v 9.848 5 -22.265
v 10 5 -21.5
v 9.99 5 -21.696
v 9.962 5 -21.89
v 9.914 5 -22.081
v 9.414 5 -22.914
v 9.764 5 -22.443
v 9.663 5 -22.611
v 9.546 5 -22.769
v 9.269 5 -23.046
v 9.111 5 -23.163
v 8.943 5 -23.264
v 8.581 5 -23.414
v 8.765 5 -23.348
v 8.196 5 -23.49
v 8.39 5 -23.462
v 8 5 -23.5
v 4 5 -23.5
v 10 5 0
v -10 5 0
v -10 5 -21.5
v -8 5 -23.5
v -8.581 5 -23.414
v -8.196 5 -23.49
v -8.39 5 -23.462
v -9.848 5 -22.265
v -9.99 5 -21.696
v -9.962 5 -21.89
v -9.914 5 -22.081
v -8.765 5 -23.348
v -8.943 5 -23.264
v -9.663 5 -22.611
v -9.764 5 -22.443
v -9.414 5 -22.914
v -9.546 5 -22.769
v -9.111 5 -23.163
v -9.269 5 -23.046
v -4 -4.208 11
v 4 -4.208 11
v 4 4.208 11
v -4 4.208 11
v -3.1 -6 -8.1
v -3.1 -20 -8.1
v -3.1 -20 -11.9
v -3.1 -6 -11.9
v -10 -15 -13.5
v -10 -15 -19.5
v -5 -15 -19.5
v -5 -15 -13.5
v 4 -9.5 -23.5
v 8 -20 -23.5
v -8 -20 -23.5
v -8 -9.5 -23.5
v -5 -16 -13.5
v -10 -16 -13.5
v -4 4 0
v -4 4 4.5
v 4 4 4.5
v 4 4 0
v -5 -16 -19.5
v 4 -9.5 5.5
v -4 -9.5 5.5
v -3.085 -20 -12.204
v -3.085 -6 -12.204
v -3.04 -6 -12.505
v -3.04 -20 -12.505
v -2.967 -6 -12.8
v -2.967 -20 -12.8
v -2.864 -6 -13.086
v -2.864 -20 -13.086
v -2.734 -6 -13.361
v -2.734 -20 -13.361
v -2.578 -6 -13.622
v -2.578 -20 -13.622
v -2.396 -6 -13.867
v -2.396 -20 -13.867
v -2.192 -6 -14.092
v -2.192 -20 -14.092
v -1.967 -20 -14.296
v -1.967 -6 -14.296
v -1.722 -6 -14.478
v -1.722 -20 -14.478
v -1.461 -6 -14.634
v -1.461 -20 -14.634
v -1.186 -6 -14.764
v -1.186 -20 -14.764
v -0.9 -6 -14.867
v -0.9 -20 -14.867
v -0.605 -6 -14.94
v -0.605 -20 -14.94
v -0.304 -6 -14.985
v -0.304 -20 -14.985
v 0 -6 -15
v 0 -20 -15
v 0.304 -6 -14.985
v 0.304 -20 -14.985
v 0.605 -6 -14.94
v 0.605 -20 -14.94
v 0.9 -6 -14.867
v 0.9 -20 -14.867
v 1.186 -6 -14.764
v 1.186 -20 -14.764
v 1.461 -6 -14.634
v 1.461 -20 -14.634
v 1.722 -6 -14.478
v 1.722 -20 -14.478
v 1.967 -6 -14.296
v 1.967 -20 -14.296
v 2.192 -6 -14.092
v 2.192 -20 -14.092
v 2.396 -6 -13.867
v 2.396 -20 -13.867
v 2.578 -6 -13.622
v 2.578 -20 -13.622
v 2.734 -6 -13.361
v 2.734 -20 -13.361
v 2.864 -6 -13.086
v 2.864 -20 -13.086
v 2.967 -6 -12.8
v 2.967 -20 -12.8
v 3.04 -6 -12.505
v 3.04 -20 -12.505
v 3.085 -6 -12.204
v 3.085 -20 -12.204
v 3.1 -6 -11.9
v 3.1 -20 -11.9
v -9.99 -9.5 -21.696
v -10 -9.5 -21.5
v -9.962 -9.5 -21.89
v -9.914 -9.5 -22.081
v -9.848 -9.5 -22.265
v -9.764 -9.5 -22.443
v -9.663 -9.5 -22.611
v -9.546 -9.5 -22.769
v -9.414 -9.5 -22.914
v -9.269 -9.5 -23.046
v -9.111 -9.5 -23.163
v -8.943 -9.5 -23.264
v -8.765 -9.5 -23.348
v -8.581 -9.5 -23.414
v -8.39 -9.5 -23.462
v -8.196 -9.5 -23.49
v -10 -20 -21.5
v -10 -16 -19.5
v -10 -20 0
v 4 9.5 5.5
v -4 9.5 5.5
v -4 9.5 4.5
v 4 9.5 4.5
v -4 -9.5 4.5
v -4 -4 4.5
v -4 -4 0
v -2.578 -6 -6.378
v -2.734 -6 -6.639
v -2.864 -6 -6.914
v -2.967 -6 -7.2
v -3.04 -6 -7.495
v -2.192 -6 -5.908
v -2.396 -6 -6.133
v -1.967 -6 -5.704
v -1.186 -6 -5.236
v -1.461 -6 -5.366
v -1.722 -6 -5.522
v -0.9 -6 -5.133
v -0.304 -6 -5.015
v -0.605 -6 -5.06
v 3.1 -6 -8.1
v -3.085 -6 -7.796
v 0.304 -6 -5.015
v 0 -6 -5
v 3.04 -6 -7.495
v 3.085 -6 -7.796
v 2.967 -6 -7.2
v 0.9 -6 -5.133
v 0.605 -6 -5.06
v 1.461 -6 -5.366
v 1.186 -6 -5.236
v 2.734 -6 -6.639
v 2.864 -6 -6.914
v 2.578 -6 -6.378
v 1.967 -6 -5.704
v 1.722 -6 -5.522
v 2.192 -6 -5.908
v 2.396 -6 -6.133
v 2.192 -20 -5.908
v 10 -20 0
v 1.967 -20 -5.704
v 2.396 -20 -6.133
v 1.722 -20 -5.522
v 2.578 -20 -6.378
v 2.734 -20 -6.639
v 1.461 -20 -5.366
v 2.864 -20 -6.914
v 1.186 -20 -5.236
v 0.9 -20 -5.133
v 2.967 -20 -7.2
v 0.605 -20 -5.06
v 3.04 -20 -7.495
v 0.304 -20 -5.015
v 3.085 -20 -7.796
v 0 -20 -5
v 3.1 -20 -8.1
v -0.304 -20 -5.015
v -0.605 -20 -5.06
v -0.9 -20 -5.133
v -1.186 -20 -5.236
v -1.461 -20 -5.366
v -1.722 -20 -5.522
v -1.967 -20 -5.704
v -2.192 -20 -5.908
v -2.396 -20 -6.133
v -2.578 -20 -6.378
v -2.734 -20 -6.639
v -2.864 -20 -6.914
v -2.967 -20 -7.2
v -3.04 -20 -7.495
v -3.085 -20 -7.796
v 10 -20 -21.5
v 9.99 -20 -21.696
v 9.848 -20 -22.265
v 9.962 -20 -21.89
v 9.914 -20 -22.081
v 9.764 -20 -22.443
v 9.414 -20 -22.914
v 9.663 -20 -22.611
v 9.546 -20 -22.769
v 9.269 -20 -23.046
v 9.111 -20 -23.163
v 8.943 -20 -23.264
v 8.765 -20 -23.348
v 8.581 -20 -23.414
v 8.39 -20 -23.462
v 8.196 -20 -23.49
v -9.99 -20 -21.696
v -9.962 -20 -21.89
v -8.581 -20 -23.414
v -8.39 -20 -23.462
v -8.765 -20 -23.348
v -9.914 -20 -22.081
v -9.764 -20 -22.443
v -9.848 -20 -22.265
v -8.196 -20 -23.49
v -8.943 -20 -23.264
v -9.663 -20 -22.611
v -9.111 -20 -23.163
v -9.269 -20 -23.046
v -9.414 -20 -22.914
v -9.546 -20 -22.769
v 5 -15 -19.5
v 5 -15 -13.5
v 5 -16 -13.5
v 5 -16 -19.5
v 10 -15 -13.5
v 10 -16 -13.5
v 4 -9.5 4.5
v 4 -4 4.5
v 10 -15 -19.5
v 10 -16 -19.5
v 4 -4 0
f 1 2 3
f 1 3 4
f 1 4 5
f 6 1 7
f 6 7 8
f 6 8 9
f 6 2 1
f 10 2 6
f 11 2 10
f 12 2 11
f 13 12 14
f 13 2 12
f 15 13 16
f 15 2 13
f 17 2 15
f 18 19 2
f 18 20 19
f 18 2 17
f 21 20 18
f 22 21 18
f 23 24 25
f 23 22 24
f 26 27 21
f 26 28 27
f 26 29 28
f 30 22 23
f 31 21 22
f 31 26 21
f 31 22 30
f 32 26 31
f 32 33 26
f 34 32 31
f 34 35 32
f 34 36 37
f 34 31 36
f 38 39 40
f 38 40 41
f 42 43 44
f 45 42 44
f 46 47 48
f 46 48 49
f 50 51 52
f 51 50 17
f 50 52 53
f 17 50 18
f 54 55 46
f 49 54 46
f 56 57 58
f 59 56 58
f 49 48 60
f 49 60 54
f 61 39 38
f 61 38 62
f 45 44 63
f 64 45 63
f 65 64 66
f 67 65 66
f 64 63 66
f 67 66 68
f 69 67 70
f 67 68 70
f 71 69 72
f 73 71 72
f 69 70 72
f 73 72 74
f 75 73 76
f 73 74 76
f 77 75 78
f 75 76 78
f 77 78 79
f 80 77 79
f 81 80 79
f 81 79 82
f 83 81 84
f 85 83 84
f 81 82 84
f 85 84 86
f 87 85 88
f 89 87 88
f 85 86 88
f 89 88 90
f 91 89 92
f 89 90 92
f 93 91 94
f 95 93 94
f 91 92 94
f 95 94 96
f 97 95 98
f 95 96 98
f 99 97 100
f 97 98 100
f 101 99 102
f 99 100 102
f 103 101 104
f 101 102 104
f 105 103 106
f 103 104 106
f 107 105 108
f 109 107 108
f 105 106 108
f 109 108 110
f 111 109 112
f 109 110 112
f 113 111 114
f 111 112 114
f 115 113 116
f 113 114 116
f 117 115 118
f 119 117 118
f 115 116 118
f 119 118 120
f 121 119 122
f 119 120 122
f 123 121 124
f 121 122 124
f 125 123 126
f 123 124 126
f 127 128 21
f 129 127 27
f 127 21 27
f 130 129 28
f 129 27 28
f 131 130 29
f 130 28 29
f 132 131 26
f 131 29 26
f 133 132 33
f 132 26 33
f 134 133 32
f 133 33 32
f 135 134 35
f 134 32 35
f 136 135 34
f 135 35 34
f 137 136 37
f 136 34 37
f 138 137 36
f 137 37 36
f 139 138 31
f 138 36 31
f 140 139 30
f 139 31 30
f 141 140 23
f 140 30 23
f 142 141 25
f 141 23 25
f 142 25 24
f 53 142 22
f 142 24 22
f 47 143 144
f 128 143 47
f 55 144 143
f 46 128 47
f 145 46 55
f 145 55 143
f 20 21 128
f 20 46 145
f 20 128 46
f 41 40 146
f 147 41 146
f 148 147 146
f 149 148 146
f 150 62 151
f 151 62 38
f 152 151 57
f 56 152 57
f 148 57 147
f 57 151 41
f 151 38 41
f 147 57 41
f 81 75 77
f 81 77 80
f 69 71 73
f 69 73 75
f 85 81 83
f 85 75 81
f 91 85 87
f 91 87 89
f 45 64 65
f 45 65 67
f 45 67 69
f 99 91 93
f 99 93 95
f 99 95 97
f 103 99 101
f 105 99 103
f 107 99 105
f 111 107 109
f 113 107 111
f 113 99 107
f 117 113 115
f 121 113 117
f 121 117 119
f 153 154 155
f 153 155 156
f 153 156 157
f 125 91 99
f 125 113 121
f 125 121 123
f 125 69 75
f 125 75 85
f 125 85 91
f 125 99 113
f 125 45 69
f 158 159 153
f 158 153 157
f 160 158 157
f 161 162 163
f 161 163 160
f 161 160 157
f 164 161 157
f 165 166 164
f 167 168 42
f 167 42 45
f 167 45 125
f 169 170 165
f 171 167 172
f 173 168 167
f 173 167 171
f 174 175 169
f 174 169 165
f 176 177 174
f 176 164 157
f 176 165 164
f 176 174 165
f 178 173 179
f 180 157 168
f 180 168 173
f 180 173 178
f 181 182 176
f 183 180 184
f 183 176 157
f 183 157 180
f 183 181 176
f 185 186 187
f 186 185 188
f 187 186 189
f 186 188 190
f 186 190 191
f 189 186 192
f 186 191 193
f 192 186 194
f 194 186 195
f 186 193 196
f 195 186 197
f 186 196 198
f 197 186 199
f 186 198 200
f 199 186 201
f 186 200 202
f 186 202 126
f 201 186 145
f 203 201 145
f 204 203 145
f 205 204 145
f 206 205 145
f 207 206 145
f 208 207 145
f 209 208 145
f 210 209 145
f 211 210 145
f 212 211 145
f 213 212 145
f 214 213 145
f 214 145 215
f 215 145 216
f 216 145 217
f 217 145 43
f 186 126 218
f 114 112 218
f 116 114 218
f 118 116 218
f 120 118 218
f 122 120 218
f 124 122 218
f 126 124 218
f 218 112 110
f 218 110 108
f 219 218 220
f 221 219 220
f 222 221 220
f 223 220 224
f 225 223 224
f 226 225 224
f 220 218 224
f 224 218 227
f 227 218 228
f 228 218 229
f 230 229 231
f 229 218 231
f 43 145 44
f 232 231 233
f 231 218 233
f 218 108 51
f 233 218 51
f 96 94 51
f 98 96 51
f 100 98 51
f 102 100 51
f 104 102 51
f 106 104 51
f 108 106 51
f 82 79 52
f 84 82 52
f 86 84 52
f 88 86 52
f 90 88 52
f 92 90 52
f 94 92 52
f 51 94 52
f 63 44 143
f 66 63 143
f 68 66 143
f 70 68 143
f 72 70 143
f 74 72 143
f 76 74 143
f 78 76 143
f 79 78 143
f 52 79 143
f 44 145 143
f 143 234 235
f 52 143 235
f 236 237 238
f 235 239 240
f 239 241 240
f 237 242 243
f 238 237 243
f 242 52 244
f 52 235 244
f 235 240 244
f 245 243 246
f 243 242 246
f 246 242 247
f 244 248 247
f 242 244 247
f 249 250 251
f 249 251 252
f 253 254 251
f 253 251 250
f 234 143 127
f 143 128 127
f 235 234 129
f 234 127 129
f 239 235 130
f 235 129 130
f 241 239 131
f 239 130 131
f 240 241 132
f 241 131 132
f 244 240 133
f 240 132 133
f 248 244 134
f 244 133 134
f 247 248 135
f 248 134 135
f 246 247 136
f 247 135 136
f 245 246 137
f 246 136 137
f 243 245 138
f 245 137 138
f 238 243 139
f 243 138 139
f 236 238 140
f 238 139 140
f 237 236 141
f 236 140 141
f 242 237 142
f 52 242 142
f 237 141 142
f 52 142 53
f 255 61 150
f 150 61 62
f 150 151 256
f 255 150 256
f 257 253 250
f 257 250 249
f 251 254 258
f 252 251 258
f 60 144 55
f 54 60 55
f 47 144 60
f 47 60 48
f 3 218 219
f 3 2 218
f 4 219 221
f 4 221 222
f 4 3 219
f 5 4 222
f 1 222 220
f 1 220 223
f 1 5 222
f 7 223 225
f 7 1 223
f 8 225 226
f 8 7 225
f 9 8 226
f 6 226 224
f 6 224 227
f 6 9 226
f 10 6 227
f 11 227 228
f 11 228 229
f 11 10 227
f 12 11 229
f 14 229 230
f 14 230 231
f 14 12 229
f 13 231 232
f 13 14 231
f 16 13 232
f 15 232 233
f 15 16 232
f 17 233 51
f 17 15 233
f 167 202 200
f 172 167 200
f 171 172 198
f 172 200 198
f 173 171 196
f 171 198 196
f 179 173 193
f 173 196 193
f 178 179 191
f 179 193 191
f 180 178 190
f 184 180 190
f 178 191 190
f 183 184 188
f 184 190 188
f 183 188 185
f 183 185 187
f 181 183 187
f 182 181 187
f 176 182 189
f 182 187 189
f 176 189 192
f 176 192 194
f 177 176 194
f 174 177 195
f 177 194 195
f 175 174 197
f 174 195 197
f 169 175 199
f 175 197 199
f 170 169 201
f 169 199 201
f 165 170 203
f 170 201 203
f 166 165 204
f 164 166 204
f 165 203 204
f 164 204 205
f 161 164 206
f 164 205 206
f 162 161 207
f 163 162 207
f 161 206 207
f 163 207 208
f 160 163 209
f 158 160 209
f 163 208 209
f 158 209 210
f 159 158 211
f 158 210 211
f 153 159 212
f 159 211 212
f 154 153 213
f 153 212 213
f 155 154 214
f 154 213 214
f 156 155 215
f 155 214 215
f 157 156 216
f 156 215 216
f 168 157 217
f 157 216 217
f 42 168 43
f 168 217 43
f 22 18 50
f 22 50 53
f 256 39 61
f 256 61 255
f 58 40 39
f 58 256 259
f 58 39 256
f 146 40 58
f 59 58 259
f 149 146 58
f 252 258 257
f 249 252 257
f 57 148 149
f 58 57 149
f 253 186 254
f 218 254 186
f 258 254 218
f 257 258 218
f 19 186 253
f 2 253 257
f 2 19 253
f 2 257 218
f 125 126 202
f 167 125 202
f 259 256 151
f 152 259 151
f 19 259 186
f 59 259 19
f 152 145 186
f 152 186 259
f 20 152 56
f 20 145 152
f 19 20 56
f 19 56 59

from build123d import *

# Parameters (mm, degrees)
ESTRUSIONE_ESTRUSIONE1_DEPTH = 8
SCHIZZO2_W                   = 14
SCHIZZO2_H                   = 5.5
ESTRUSIONE_ESTRUSIONE2_DEPTH = 9.208407085
SCHIZZO3_W                   = 6
SCHIZZO3_H                   = 5.5
ESTRUSIONE_ESTRUSIONE3_DEPTH = 5.291592915
SCHIZZO4_W                   = 14
SCHIZZO4_H                   = 14.5
ESTRUSIONE_ESTRUSIONE4_DEPTH = 5.5
ESTRUSIONE_ESTRUSIONE5_DEPTH = 4.5
TAGLIO_ESTRUSIONE1_DEPTH     = 8
TAGLIO_ESTRUSIONE2_DEPTH     = 5.5
SCHIZZO8_W                   = 14
SCHIZZO8_H                   = 19
ESTRUSIONE_ESTRUSIONE6_DEPTH = 23.5
ESTRUSIONE_ESTRUSIONE7_DEPTH = 10.5
TAGLIO_ESTRUSIONE3_DEPTH     = 4.5
TAGLIO_ESTRUSIONE4_DEPTH     = 1
TAGLIO_ESTRUSIONE5_DEPTH     = 4.5
SCHIZZO13_W                  = 23.5
SCHIZZO13_H                  = 25
ESTRUSIONE_ESTRUSIONE8_DEPTH = 6
SCHIZZO14_W                  = 6
SCHIZZO14_H                  = 1
TAGLIO_ESTRUSIONE6_DEPTH     = 5
TAGLIO_ESTRUSIONE7_DEPTH     = 14
SCHIZZO16_W                  = 6
SCHIZZO16_H                  = 1
TAGLIO_ESTRUSIONE8_DEPTH     = 5
RACCORDO1_R                  = 2


with BuildPart() as part:
    # Schizzo1 → Estrusione-Estrusione1 (new body)
    with BuildSketch(Plane(origin=(4, 0, 0), x_dir=(0, 0, -1), z_dir=(1, 0, 0))):
        Polygon((-5.5, -9.5), (-5.5, -4.208407085), (-11, -4.208407085), align=None)
    extrude(amount=-ESTRUSIONE_ESTRUSIONE1_DEPTH)

    # Schizzo2 → Estrusione-Estrusione2 (add)
    with BuildSketch(Plane(origin=(0, -4.208407085, 0), x_dir=(-1, 0, 0), z_dir=(0, 1, 0))):
        with Locations((3, 8.25)):
            Rectangle(SCHIZZO2_W, SCHIZZO2_H)
    extrude(amount=ESTRUSIONE_ESTRUSIONE2_DEPTH)

    # Schizzo3 → Estrusione-Estrusione3 (add)
    with BuildSketch(Plane.XZ.offset(4.208407085)):
        with Locations((-7, 8.25)):
            Rectangle(SCHIZZO3_W, SCHIZZO3_H)
    extrude(amount=ESTRUSIONE_ESTRUSIONE3_DEPTH)

    # Schizzo4 → Estrusione-Estrusione4 (add)
    with BuildSketch(Plane(origin=(0, 0, 5.5), x_dir=(-1, 0, 0), z_dir=(0, 9.448610433574674e-12, -1.0))):
        with Locations((3, -2.25)):
            Rectangle(SCHIZZO4_W, SCHIZZO4_H)
    extrude(amount=ESTRUSIONE_ESTRUSIONE4_DEPTH)

    # Schizzo5 → Estrusione-Estrusione5 (add)
    with BuildSketch(Plane(origin=(0, 5, 0), x_dir=(-1, 0, 0), z_dir=(0, 1, 0))):
        with BuildLine():
            Line((10, 0), (-4, 0))
            add(Edge.make_bspline(
                [(-4, 4.5), (-4, 3), (-4, 1.5), (-4, 0)],
                knots=[0, 0, 0, 0, 1, 1, 1, 1], degree=3))
            Line((-4, 4.5), (-4, 11))
            Line((-4, 11), (10, 11))
            add(Edge.make_bspline(
                [(10, 11), (10, 9.166666667), (10, 7.333333333), (10, 5.5)],
                knots=[0, 0, 0, 0, 1, 1, 1, 1], degree=3))
            add(Edge.make_bspline(
                [(10, 5.5), (10, 5.166666667), (10, 4.833333333), (10, 4.5)],
                knots=[0, 0, 0, 0, 1, 1, 1, 1], degree=3))
            add(Edge.make_bspline(
                [(10, 4.5), (10, 3), (10, 1.5), (10, 0)],
                knots=[0, 0, 0, 0, 1, 1, 1, 1], degree=3))
        make_face()
    extrude(amount=ESTRUSIONE_ESTRUSIONE5_DEPTH)

    # Schizzo6 → Taglio-Estrusione1 (cut)
    with BuildSketch(Plane(origin=(4, 0, 0), x_dir=(0, 0, -1), z_dir=(1, 0, 0))):
        Polygon((-11, 4.208407085), (-5.5, 9.5), (-11, 9.5), align=None)
    extrude(amount=-TAGLIO_ESTRUSIONE1_DEPTH, mode=Mode.SUBTRACT)

    # Schizzo7 → Taglio-Estrusione2 (cut)
    with BuildSketch(Plane.XY.offset(11)):
        with BuildLine():
            Line((-10, -9.5), (-4, -9.5))
            Line((-4, -9.5), (-4, 9.5))
            Line((-4, 9.5), (-10, 9.5))
            add(Edge.make_bspline(
                [(-10, 9.5), (-10, 8), (-10, 6.5), (-10, 5)],
                knots=[0, 0, 0, 0, 1, 1, 1, 1], degree=3))
            Line((-10, 5), (-10, -9.5))
        make_face()
    extrude(amount=-TAGLIO_ESTRUSIONE2_DEPTH, mode=Mode.SUBTRACT)

    # Schizzo8 → Estrusione-Estrusione6 (add)
    with BuildSketch(Plane(origin=(0, 0, 0), x_dir=(-1, 0, 0), z_dir=(0, 3.448151725834727e-12, -1.0))):
        with Locations((3, 0)):
            Rectangle(SCHIZZO8_W, SCHIZZO8_H)
    extrude(amount=ESTRUSIONE_ESTRUSIONE6_DEPTH)

    # Schizzo9 → Estrusione-Estrusione7 (add)
    with BuildSketch(Plane.XZ.offset(9.5)):
        with BuildLine():
            Line((4, -23.5), (-10, -23.5))
            Line((-10, -23.5), (-10, 0))
            add(Edge.make_bspline(
                [(-10, 4.5), (-10, 3), (-10, 1.5), (-10, 0)],
                knots=[0, 0, 0, 0, 1, 1, 1, 1], degree=3))
            add(Edge.make_bspline(
                [(-10, 5.5), (-10, 5.166666667), (-10, 4.833333333), (-10, 4.5)],
                knots=[0, 0, 0, 0, 1, 1, 1, 1], degree=3))
            Line((-10, 5.5), (4, 5.5))
            add(Edge.make_bspline(
                [(4, 5.5), (4, 5.166666667), (4, 4.833333333), (4, 4.5)],
                knots=[0, 0, 0, 0, 1, 1, 1, 1], degree=3))
            add(Edge.make_bspline(
                [(4, 4.5), (4, 3), (4, 1.5), (4, 0)],
                knots=[0, 0, 0, 0, 1, 1, 1, 1], degree=3))
            Line((4, 0), (4, -23.5))
        make_face()
    extrude(amount=ESTRUSIONE_ESTRUSIONE7_DEPTH)

    # Schizzo10 → Taglio-Estrusione3 (cut)
    with BuildSketch(Plane(origin=(0, 9.5, 0), x_dir=(-1, 0, 0), z_dir=(0, 1, 0))):
        with BuildLine():
            Line((10, -23.5), (10, 0))
            add(Edge.make_bspline(
                [(10, 4.5), (10, 3), (10, 1.5), (10, 0)],
                knots=[0, 0, 0, 0, 1, 1, 1, 1], degree=3))
            add(Edge.make_bspline(
                [(10, 5.5), (10, 5.166666667), (10, 4.833333333), (10, 4.5)],
                knots=[0, 0, 0, 0, 1, 1, 1, 1], degree=3))
            Line((10, 5.5), (4, 5.5))
            Line((4, 5.5), (4, 4.5))
            Line((4, 4.5), (-4, 4.5))
            add(Edge.make_bspline(
                [(-4, 4.5), (-4, 3), (-4, 1.5), (-4, 0)],
                knots=[0, 0, 0, 0, 1, 1, 1, 1], degree=3))
            Line((-4, 0), (-4, -23.5))
            Line((-4, -23.5), (10, -23.5))
        make_face()
    extrude(amount=-TAGLIO_ESTRUSIONE3_DEPTH, mode=Mode.SUBTRACT)

    # Schizzo11 → Taglio-Estrusione4 (cut)
    with BuildSketch(Plane.XY.offset(5.5)):
        Polygon((-4, -9.5), (-4, 5), (-10, 5), (-10, -20), (4, -20), (4, -9.5), align=None)
    extrude(amount=-TAGLIO_ESTRUSIONE4_DEPTH, mode=Mode.SUBTRACT)

    # Schizzo12 → Taglio-Estrusione5 (cut)
    with BuildSketch(Plane.XY.offset(4.5)):
        Polygon((4, 4), (4, 5), (-10, 5), (-10, -20), (4, -20), (4, -4), (-4, -4), (-4, 4), align=None)
    extrude(amount=-TAGLIO_ESTRUSIONE5_DEPTH, mode=Mode.SUBTRACT)

    # Schizzo13 → Estrusione-Estrusione8 (add)
    with BuildSketch(Plane(origin=(4, 0, 0), x_dir=(0, 0, -1), z_dir=(1, 0, 0))):
        with Locations((11.75, -7.5)):
            Rectangle(SCHIZZO13_W, SCHIZZO13_H)
    extrude(amount=ESTRUSIONE_ESTRUSIONE8_DEPTH)

    # Schizzo14 → Taglio-Estrusione6 (cut)
    with BuildSketch(Plane.ZY.offset(10)):
        with Locations((-16.5, -15.5)):
            Rectangle(SCHIZZO14_W, SCHIZZO14_H)
    extrude(amount=-TAGLIO_ESTRUSIONE6_DEPTH, mode=Mode.SUBTRACT)

    # Schizzo15 → Taglio-Estrusione7 (cut)
    with BuildSketch(Plane.XZ.offset(20)):
        with BuildLine():
            Line((3.1, -11.9000249), (3.1, -8.0999751))
            ThreePointArc((3.1, -8.0999751), (0, -4.9999751), (-3.1, -8.0999751))
            Line((-3.1, -8.0999751), (-3.1, -11.9000249))
            ThreePointArc((-3.1, -11.9000249), (0, -15.0000249), (3.1, -11.9000249))
        make_face()
    extrude(amount=-TAGLIO_ESTRUSIONE7_DEPTH, mode=Mode.SUBTRACT)

    # Schizzo16 → Taglio-Estrusione8 (cut)
    with BuildSketch(Plane(origin=(10, 0, 0), x_dir=(0, 0, -1), z_dir=(1, 0, 0))):
        with Locations((16.5, -15.5)):
            Rectangle(SCHIZZO16_W, SCHIZZO16_H)
    extrude(amount=-TAGLIO_ESTRUSIONE8_DEPTH, mode=Mode.SUBTRACT)

    # Raccordo1
    raccordo1_edges = [part.edges().sort_by_distance(p)[0] for p in [
        (-10, -2.25, -23.5),
        (10, -7.5, -23.5),
    ]]
    fillet(raccordo1_edges, radius=RACCORDO1_R)


solid = part.part
